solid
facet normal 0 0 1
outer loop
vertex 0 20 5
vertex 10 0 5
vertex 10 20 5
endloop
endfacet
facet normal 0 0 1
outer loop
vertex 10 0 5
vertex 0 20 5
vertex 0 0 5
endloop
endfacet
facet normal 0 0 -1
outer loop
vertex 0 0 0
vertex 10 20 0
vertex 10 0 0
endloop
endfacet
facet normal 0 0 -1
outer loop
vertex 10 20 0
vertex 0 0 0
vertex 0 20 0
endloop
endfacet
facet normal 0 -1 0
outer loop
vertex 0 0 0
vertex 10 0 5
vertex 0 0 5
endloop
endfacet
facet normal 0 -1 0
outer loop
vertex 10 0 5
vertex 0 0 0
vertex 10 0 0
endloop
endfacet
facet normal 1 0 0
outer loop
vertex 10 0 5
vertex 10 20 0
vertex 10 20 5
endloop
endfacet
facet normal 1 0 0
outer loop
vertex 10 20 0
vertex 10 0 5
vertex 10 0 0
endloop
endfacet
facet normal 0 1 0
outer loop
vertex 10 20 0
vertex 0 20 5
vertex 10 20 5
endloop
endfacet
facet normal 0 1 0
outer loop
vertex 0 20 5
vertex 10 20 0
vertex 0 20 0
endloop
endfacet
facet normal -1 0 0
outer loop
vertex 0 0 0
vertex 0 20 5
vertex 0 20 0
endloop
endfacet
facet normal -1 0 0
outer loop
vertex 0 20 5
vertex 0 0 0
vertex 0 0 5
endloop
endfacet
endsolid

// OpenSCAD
// Simple test file with variables and a module

/* [Basic Settings] */

// Width of the box
Width = 10;

// Height of the box
Height = 20;

/* [Hidden] */
internal_val = 5;

module simpleBox() {
  cube([Width, Height, internal_val]);
}

simpleBox();
